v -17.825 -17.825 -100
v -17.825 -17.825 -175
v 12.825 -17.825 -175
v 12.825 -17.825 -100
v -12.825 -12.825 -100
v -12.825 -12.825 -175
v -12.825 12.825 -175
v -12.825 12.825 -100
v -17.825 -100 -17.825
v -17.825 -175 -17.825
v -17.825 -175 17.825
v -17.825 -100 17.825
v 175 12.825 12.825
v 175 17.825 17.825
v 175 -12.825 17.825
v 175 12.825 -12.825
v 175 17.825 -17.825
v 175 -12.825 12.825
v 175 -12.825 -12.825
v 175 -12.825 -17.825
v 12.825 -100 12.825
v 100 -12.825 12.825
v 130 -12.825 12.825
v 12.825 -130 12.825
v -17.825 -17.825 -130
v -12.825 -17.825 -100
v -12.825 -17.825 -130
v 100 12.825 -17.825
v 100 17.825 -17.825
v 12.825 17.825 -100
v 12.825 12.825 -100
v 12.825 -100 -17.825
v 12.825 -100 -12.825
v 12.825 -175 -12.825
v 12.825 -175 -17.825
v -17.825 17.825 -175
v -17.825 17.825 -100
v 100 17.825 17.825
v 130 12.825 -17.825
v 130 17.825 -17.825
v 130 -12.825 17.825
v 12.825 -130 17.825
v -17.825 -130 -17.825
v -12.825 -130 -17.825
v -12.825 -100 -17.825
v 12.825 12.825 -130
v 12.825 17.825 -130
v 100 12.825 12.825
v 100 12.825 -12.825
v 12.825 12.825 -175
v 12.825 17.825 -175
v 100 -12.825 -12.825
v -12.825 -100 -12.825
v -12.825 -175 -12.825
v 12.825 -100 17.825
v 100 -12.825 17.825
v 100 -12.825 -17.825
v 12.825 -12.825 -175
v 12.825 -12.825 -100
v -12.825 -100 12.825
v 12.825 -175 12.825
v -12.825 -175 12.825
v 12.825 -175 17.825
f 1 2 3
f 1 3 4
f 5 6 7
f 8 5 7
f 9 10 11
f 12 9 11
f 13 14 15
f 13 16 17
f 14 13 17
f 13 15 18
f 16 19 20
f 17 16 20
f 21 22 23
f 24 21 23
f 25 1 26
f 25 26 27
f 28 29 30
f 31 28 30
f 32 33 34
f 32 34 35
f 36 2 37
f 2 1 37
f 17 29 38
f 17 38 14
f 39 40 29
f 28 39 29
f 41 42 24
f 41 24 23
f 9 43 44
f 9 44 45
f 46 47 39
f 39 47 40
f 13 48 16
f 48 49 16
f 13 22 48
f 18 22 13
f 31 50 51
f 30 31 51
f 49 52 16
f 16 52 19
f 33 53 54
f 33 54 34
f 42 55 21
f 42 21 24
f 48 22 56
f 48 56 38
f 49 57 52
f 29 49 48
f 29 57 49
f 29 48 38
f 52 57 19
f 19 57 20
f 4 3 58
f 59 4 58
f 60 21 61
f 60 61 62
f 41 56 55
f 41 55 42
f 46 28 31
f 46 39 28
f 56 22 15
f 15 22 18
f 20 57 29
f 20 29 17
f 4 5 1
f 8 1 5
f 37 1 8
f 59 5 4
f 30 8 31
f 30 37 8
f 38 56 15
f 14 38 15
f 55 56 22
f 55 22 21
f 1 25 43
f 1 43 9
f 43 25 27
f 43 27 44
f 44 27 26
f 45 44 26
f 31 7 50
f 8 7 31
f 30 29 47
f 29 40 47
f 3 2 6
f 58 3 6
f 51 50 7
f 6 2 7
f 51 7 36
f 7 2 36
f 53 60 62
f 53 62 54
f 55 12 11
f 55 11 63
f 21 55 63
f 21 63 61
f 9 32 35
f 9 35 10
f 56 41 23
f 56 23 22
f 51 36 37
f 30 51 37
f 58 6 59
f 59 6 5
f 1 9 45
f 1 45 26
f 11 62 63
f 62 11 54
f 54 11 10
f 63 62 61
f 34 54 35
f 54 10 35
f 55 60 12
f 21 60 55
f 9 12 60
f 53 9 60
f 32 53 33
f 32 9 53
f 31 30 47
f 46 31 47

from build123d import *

# Parameters (mm, degrees)
C_START                                 = -12.825
C_CHANNEL_IGVC_5MM_CORNER_3_OUTLINE_W   = 162.175
C_CHANNEL_IGVC_5MM_CORNER_3_OUTLINE_H   = 5
C_CHANNEL_IGVC_5MM_CORNER_3_DEPTH       = 30.65
C_START_2                               = 12.825
C_CHANNEL_IGVC_5MM_CORNER_3_2_DEPTH     = 5
C_START_3                               = -175
C_CHANNEL_IGVC_5MM_CORNER_3_3_DEPTH     = 157.175
C_START_4                               = -17.825
C_CHANNEL_IGVC_5MM_CORNER_3_4_OUTLINE_W = 5
C_CHANNEL_IGVC_5MM_CORNER_3_4_OUTLINE_H = 175
C_CHANNEL_IGVC_5MM_CORNER_3_4_DEPTH     = 30.65
C_CHANNEL_IGVC_5MM_CORNER_3_5_OUTLINE_W = 25.65
C_CHANNEL_IGVC_5MM_CORNER_3_5_OUTLINE_H = 175
C_CHANNEL_IGVC_5MM_CORNER_3_5_DEPTH     = 5
CUT_EXTRUDE1_DEPTH                      = 100
CUT_EXTRUDE1_DEPTH_BACK                 = 100
SKETCH16_W                              = 200
SKETCH16_H                              = 200
BOSS_EXTRUDE2_DEPTH                     = 5
BOSS_EXTRUDE3_DEPTH                     = 5
BOSS_EXTRUDE4_DEPTH                     = 5


# Read off the part's stored shape, not the designer's step: C channel IGVC_5MM_CORNER(3)
with BuildPart() as part:
    # C channel IGVC_5MM_CORNER(3) outline → C channel IGVC_5MM_CORNER(3) (new body)
    with BuildSketch(Plane(origin=(0, 0, 0), x_dir=(1, 0, 0), z_dir=(0, 1, 0)).offset(C_START)):
        with Locations((93.9125, 15.325)):
            Rectangle(C_CHANNEL_IGVC_5MM_CORNER_3_OUTLINE_W, C_CHANNEL_IGVC_5MM_CORNER_3_OUTLINE_H)
        with Locations((93.9125, -15.325)):
            Rectangle(C_CHANNEL_IGVC_5MM_CORNER_3_OUTLINE_W, C_CHANNEL_IGVC_5MM_CORNER_3_OUTLINE_H)
    extrude(amount=C_CHANNEL_IGVC_5MM_CORNER_3_DEPTH)

    # C channel IGVC_5MM_CORNER_3 2 outline → C channel IGVC_5MM_CORNER_3 2 (add)
    with BuildSketch(Plane(origin=(0, 0, 0), x_dir=(1, 0, 0), z_dir=(0, 1, 0)).offset(C_START_2)):
        Polygon((175, -12.825), (175, 12.825), (12.825, 12.825), (12.825, 0), (-12.825, 0), (-12.825, -12.825), align=None)
    extrude(amount=C_CHANNEL_IGVC_5MM_CORNER_3_2_DEPTH)


with BuildPart() as body_2:
    # C channel IGVC_5MM_CORNER_3 3 outline → C channel IGVC_5MM_CORNER_3 3 (new body)
    with BuildSketch(Plane(origin=(0, 0, 0), x_dir=(1, 0, 0), z_dir=(0, 1, 0)).offset(C_START_3)):
        Polygon((12.825, 12.825), (12.825, 17.825), (-17.825, 17.825), (-17.825, -17.825), (12.825, -17.825), (12.825, -12.825), (-12.825, -12.825), (-12.825, 12.825), align=None)
    extrude(amount=C_CHANNEL_IGVC_5MM_CORNER_3_3_DEPTH)


with BuildPart() as body_3:
    # C channel IGVC_5MM_CORNER_3 4 outline → C channel IGVC_5MM_CORNER_3 4 (new body)
    with BuildSketch(Plane.YZ.offset(C_START_4)):
        with Locations((-15.325, -87.5)):
            Rectangle(C_CHANNEL_IGVC_5MM_CORNER_3_4_OUTLINE_W, C_CHANNEL_IGVC_5MM_CORNER_3_4_OUTLINE_H)
        with Locations((15.325, -87.5)):
            Rectangle(C_CHANNEL_IGVC_5MM_CORNER_3_4_OUTLINE_W, C_CHANNEL_IGVC_5MM_CORNER_3_4_OUTLINE_H)
    extrude(amount=C_CHANNEL_IGVC_5MM_CORNER_3_4_DEPTH)

    # C channel IGVC_5MM_CORNER_3 5 outline → C channel IGVC_5MM_CORNER_3 5 (add)
    with BuildSketch(Plane.YZ.offset(C_START_4)):
        with Locations((0, -87.5)):
            Rectangle(C_CHANNEL_IGVC_5MM_CORNER_3_5_OUTLINE_W, C_CHANNEL_IGVC_5MM_CORNER_3_5_OUTLINE_H)
    extrude(amount=C_CHANNEL_IGVC_5MM_CORNER_3_5_DEPTH)


with BuildPart() as cut_extrude1_tool:
    # Sketch16 → Cut-Extrude1 (new, two sides: drawn at the far end of the back side and taken through both)
    with BuildSketch(Plane.XY.offset(-CUT_EXTRUDE1_DEPTH_BACK)):
        Rectangle(SKETCH16_W, SKETCH16_H)
    extrude(amount=CUT_EXTRUDE1_DEPTH + CUT_EXTRUDE1_DEPTH_BACK)


with BuildPart() as part_1:
    add(part.part)

    # Cut-Extrude1: cut by cut_extrude1_tool
    add(cut_extrude1_tool.part, mode=Mode.SUBTRACT)


with BuildPart() as body_2_1:
    add(body_2.part)

    # Cut-Extrude1: cut by cut_extrude1_tool
    add(cut_extrude1_tool.part, mode=Mode.SUBTRACT)


with BuildPart() as body_3_1:
    add(body_3.part)

    # Cut-Extrude1: cut by cut_extrude1_tool
    add(cut_extrude1_tool.part, mode=Mode.SUBTRACT)


with BuildPart() as body_4:
    # Sketch17 → Boss-Extrude2 (new body)
    with BuildSketch(Plane.ZY.offset(17.825)):
        Polygon((-17.825, -100), (-100, -17.825), (-130, -17.825), (-17.825, -130), align=None)
    extrude(amount=-BOSS_EXTRUDE2_DEPTH)


with BuildPart() as body_5:
    # Sketch20 → Boss-Extrude3 (new body)
    with BuildSketch(Plane.XY.offset(17.825)):
        Polygon((12.825, -130), (130, -12.825), (100, -12.825), (12.825, -100), align=None)
    extrude(amount=-BOSS_EXTRUDE3_DEPTH)


with BuildPart() as body_6:
    # Sketch21 → Boss-Extrude4 (new body)
    with BuildSketch(Plane(origin=(0, 17.825, 0), x_dir=(1, 0, 0), z_dir=(0, 1, 0))):
        Polygon((100, 17.825), (12.825, 100), (12.825, 130), (130, 17.825), align=None)
    extrude(amount=-BOSS_EXTRUDE4_DEPTH)


solid = Compound([part_1.part, body_2_1.part, body_3_1.part, body_4.part, body_5.part, body_6.part])
